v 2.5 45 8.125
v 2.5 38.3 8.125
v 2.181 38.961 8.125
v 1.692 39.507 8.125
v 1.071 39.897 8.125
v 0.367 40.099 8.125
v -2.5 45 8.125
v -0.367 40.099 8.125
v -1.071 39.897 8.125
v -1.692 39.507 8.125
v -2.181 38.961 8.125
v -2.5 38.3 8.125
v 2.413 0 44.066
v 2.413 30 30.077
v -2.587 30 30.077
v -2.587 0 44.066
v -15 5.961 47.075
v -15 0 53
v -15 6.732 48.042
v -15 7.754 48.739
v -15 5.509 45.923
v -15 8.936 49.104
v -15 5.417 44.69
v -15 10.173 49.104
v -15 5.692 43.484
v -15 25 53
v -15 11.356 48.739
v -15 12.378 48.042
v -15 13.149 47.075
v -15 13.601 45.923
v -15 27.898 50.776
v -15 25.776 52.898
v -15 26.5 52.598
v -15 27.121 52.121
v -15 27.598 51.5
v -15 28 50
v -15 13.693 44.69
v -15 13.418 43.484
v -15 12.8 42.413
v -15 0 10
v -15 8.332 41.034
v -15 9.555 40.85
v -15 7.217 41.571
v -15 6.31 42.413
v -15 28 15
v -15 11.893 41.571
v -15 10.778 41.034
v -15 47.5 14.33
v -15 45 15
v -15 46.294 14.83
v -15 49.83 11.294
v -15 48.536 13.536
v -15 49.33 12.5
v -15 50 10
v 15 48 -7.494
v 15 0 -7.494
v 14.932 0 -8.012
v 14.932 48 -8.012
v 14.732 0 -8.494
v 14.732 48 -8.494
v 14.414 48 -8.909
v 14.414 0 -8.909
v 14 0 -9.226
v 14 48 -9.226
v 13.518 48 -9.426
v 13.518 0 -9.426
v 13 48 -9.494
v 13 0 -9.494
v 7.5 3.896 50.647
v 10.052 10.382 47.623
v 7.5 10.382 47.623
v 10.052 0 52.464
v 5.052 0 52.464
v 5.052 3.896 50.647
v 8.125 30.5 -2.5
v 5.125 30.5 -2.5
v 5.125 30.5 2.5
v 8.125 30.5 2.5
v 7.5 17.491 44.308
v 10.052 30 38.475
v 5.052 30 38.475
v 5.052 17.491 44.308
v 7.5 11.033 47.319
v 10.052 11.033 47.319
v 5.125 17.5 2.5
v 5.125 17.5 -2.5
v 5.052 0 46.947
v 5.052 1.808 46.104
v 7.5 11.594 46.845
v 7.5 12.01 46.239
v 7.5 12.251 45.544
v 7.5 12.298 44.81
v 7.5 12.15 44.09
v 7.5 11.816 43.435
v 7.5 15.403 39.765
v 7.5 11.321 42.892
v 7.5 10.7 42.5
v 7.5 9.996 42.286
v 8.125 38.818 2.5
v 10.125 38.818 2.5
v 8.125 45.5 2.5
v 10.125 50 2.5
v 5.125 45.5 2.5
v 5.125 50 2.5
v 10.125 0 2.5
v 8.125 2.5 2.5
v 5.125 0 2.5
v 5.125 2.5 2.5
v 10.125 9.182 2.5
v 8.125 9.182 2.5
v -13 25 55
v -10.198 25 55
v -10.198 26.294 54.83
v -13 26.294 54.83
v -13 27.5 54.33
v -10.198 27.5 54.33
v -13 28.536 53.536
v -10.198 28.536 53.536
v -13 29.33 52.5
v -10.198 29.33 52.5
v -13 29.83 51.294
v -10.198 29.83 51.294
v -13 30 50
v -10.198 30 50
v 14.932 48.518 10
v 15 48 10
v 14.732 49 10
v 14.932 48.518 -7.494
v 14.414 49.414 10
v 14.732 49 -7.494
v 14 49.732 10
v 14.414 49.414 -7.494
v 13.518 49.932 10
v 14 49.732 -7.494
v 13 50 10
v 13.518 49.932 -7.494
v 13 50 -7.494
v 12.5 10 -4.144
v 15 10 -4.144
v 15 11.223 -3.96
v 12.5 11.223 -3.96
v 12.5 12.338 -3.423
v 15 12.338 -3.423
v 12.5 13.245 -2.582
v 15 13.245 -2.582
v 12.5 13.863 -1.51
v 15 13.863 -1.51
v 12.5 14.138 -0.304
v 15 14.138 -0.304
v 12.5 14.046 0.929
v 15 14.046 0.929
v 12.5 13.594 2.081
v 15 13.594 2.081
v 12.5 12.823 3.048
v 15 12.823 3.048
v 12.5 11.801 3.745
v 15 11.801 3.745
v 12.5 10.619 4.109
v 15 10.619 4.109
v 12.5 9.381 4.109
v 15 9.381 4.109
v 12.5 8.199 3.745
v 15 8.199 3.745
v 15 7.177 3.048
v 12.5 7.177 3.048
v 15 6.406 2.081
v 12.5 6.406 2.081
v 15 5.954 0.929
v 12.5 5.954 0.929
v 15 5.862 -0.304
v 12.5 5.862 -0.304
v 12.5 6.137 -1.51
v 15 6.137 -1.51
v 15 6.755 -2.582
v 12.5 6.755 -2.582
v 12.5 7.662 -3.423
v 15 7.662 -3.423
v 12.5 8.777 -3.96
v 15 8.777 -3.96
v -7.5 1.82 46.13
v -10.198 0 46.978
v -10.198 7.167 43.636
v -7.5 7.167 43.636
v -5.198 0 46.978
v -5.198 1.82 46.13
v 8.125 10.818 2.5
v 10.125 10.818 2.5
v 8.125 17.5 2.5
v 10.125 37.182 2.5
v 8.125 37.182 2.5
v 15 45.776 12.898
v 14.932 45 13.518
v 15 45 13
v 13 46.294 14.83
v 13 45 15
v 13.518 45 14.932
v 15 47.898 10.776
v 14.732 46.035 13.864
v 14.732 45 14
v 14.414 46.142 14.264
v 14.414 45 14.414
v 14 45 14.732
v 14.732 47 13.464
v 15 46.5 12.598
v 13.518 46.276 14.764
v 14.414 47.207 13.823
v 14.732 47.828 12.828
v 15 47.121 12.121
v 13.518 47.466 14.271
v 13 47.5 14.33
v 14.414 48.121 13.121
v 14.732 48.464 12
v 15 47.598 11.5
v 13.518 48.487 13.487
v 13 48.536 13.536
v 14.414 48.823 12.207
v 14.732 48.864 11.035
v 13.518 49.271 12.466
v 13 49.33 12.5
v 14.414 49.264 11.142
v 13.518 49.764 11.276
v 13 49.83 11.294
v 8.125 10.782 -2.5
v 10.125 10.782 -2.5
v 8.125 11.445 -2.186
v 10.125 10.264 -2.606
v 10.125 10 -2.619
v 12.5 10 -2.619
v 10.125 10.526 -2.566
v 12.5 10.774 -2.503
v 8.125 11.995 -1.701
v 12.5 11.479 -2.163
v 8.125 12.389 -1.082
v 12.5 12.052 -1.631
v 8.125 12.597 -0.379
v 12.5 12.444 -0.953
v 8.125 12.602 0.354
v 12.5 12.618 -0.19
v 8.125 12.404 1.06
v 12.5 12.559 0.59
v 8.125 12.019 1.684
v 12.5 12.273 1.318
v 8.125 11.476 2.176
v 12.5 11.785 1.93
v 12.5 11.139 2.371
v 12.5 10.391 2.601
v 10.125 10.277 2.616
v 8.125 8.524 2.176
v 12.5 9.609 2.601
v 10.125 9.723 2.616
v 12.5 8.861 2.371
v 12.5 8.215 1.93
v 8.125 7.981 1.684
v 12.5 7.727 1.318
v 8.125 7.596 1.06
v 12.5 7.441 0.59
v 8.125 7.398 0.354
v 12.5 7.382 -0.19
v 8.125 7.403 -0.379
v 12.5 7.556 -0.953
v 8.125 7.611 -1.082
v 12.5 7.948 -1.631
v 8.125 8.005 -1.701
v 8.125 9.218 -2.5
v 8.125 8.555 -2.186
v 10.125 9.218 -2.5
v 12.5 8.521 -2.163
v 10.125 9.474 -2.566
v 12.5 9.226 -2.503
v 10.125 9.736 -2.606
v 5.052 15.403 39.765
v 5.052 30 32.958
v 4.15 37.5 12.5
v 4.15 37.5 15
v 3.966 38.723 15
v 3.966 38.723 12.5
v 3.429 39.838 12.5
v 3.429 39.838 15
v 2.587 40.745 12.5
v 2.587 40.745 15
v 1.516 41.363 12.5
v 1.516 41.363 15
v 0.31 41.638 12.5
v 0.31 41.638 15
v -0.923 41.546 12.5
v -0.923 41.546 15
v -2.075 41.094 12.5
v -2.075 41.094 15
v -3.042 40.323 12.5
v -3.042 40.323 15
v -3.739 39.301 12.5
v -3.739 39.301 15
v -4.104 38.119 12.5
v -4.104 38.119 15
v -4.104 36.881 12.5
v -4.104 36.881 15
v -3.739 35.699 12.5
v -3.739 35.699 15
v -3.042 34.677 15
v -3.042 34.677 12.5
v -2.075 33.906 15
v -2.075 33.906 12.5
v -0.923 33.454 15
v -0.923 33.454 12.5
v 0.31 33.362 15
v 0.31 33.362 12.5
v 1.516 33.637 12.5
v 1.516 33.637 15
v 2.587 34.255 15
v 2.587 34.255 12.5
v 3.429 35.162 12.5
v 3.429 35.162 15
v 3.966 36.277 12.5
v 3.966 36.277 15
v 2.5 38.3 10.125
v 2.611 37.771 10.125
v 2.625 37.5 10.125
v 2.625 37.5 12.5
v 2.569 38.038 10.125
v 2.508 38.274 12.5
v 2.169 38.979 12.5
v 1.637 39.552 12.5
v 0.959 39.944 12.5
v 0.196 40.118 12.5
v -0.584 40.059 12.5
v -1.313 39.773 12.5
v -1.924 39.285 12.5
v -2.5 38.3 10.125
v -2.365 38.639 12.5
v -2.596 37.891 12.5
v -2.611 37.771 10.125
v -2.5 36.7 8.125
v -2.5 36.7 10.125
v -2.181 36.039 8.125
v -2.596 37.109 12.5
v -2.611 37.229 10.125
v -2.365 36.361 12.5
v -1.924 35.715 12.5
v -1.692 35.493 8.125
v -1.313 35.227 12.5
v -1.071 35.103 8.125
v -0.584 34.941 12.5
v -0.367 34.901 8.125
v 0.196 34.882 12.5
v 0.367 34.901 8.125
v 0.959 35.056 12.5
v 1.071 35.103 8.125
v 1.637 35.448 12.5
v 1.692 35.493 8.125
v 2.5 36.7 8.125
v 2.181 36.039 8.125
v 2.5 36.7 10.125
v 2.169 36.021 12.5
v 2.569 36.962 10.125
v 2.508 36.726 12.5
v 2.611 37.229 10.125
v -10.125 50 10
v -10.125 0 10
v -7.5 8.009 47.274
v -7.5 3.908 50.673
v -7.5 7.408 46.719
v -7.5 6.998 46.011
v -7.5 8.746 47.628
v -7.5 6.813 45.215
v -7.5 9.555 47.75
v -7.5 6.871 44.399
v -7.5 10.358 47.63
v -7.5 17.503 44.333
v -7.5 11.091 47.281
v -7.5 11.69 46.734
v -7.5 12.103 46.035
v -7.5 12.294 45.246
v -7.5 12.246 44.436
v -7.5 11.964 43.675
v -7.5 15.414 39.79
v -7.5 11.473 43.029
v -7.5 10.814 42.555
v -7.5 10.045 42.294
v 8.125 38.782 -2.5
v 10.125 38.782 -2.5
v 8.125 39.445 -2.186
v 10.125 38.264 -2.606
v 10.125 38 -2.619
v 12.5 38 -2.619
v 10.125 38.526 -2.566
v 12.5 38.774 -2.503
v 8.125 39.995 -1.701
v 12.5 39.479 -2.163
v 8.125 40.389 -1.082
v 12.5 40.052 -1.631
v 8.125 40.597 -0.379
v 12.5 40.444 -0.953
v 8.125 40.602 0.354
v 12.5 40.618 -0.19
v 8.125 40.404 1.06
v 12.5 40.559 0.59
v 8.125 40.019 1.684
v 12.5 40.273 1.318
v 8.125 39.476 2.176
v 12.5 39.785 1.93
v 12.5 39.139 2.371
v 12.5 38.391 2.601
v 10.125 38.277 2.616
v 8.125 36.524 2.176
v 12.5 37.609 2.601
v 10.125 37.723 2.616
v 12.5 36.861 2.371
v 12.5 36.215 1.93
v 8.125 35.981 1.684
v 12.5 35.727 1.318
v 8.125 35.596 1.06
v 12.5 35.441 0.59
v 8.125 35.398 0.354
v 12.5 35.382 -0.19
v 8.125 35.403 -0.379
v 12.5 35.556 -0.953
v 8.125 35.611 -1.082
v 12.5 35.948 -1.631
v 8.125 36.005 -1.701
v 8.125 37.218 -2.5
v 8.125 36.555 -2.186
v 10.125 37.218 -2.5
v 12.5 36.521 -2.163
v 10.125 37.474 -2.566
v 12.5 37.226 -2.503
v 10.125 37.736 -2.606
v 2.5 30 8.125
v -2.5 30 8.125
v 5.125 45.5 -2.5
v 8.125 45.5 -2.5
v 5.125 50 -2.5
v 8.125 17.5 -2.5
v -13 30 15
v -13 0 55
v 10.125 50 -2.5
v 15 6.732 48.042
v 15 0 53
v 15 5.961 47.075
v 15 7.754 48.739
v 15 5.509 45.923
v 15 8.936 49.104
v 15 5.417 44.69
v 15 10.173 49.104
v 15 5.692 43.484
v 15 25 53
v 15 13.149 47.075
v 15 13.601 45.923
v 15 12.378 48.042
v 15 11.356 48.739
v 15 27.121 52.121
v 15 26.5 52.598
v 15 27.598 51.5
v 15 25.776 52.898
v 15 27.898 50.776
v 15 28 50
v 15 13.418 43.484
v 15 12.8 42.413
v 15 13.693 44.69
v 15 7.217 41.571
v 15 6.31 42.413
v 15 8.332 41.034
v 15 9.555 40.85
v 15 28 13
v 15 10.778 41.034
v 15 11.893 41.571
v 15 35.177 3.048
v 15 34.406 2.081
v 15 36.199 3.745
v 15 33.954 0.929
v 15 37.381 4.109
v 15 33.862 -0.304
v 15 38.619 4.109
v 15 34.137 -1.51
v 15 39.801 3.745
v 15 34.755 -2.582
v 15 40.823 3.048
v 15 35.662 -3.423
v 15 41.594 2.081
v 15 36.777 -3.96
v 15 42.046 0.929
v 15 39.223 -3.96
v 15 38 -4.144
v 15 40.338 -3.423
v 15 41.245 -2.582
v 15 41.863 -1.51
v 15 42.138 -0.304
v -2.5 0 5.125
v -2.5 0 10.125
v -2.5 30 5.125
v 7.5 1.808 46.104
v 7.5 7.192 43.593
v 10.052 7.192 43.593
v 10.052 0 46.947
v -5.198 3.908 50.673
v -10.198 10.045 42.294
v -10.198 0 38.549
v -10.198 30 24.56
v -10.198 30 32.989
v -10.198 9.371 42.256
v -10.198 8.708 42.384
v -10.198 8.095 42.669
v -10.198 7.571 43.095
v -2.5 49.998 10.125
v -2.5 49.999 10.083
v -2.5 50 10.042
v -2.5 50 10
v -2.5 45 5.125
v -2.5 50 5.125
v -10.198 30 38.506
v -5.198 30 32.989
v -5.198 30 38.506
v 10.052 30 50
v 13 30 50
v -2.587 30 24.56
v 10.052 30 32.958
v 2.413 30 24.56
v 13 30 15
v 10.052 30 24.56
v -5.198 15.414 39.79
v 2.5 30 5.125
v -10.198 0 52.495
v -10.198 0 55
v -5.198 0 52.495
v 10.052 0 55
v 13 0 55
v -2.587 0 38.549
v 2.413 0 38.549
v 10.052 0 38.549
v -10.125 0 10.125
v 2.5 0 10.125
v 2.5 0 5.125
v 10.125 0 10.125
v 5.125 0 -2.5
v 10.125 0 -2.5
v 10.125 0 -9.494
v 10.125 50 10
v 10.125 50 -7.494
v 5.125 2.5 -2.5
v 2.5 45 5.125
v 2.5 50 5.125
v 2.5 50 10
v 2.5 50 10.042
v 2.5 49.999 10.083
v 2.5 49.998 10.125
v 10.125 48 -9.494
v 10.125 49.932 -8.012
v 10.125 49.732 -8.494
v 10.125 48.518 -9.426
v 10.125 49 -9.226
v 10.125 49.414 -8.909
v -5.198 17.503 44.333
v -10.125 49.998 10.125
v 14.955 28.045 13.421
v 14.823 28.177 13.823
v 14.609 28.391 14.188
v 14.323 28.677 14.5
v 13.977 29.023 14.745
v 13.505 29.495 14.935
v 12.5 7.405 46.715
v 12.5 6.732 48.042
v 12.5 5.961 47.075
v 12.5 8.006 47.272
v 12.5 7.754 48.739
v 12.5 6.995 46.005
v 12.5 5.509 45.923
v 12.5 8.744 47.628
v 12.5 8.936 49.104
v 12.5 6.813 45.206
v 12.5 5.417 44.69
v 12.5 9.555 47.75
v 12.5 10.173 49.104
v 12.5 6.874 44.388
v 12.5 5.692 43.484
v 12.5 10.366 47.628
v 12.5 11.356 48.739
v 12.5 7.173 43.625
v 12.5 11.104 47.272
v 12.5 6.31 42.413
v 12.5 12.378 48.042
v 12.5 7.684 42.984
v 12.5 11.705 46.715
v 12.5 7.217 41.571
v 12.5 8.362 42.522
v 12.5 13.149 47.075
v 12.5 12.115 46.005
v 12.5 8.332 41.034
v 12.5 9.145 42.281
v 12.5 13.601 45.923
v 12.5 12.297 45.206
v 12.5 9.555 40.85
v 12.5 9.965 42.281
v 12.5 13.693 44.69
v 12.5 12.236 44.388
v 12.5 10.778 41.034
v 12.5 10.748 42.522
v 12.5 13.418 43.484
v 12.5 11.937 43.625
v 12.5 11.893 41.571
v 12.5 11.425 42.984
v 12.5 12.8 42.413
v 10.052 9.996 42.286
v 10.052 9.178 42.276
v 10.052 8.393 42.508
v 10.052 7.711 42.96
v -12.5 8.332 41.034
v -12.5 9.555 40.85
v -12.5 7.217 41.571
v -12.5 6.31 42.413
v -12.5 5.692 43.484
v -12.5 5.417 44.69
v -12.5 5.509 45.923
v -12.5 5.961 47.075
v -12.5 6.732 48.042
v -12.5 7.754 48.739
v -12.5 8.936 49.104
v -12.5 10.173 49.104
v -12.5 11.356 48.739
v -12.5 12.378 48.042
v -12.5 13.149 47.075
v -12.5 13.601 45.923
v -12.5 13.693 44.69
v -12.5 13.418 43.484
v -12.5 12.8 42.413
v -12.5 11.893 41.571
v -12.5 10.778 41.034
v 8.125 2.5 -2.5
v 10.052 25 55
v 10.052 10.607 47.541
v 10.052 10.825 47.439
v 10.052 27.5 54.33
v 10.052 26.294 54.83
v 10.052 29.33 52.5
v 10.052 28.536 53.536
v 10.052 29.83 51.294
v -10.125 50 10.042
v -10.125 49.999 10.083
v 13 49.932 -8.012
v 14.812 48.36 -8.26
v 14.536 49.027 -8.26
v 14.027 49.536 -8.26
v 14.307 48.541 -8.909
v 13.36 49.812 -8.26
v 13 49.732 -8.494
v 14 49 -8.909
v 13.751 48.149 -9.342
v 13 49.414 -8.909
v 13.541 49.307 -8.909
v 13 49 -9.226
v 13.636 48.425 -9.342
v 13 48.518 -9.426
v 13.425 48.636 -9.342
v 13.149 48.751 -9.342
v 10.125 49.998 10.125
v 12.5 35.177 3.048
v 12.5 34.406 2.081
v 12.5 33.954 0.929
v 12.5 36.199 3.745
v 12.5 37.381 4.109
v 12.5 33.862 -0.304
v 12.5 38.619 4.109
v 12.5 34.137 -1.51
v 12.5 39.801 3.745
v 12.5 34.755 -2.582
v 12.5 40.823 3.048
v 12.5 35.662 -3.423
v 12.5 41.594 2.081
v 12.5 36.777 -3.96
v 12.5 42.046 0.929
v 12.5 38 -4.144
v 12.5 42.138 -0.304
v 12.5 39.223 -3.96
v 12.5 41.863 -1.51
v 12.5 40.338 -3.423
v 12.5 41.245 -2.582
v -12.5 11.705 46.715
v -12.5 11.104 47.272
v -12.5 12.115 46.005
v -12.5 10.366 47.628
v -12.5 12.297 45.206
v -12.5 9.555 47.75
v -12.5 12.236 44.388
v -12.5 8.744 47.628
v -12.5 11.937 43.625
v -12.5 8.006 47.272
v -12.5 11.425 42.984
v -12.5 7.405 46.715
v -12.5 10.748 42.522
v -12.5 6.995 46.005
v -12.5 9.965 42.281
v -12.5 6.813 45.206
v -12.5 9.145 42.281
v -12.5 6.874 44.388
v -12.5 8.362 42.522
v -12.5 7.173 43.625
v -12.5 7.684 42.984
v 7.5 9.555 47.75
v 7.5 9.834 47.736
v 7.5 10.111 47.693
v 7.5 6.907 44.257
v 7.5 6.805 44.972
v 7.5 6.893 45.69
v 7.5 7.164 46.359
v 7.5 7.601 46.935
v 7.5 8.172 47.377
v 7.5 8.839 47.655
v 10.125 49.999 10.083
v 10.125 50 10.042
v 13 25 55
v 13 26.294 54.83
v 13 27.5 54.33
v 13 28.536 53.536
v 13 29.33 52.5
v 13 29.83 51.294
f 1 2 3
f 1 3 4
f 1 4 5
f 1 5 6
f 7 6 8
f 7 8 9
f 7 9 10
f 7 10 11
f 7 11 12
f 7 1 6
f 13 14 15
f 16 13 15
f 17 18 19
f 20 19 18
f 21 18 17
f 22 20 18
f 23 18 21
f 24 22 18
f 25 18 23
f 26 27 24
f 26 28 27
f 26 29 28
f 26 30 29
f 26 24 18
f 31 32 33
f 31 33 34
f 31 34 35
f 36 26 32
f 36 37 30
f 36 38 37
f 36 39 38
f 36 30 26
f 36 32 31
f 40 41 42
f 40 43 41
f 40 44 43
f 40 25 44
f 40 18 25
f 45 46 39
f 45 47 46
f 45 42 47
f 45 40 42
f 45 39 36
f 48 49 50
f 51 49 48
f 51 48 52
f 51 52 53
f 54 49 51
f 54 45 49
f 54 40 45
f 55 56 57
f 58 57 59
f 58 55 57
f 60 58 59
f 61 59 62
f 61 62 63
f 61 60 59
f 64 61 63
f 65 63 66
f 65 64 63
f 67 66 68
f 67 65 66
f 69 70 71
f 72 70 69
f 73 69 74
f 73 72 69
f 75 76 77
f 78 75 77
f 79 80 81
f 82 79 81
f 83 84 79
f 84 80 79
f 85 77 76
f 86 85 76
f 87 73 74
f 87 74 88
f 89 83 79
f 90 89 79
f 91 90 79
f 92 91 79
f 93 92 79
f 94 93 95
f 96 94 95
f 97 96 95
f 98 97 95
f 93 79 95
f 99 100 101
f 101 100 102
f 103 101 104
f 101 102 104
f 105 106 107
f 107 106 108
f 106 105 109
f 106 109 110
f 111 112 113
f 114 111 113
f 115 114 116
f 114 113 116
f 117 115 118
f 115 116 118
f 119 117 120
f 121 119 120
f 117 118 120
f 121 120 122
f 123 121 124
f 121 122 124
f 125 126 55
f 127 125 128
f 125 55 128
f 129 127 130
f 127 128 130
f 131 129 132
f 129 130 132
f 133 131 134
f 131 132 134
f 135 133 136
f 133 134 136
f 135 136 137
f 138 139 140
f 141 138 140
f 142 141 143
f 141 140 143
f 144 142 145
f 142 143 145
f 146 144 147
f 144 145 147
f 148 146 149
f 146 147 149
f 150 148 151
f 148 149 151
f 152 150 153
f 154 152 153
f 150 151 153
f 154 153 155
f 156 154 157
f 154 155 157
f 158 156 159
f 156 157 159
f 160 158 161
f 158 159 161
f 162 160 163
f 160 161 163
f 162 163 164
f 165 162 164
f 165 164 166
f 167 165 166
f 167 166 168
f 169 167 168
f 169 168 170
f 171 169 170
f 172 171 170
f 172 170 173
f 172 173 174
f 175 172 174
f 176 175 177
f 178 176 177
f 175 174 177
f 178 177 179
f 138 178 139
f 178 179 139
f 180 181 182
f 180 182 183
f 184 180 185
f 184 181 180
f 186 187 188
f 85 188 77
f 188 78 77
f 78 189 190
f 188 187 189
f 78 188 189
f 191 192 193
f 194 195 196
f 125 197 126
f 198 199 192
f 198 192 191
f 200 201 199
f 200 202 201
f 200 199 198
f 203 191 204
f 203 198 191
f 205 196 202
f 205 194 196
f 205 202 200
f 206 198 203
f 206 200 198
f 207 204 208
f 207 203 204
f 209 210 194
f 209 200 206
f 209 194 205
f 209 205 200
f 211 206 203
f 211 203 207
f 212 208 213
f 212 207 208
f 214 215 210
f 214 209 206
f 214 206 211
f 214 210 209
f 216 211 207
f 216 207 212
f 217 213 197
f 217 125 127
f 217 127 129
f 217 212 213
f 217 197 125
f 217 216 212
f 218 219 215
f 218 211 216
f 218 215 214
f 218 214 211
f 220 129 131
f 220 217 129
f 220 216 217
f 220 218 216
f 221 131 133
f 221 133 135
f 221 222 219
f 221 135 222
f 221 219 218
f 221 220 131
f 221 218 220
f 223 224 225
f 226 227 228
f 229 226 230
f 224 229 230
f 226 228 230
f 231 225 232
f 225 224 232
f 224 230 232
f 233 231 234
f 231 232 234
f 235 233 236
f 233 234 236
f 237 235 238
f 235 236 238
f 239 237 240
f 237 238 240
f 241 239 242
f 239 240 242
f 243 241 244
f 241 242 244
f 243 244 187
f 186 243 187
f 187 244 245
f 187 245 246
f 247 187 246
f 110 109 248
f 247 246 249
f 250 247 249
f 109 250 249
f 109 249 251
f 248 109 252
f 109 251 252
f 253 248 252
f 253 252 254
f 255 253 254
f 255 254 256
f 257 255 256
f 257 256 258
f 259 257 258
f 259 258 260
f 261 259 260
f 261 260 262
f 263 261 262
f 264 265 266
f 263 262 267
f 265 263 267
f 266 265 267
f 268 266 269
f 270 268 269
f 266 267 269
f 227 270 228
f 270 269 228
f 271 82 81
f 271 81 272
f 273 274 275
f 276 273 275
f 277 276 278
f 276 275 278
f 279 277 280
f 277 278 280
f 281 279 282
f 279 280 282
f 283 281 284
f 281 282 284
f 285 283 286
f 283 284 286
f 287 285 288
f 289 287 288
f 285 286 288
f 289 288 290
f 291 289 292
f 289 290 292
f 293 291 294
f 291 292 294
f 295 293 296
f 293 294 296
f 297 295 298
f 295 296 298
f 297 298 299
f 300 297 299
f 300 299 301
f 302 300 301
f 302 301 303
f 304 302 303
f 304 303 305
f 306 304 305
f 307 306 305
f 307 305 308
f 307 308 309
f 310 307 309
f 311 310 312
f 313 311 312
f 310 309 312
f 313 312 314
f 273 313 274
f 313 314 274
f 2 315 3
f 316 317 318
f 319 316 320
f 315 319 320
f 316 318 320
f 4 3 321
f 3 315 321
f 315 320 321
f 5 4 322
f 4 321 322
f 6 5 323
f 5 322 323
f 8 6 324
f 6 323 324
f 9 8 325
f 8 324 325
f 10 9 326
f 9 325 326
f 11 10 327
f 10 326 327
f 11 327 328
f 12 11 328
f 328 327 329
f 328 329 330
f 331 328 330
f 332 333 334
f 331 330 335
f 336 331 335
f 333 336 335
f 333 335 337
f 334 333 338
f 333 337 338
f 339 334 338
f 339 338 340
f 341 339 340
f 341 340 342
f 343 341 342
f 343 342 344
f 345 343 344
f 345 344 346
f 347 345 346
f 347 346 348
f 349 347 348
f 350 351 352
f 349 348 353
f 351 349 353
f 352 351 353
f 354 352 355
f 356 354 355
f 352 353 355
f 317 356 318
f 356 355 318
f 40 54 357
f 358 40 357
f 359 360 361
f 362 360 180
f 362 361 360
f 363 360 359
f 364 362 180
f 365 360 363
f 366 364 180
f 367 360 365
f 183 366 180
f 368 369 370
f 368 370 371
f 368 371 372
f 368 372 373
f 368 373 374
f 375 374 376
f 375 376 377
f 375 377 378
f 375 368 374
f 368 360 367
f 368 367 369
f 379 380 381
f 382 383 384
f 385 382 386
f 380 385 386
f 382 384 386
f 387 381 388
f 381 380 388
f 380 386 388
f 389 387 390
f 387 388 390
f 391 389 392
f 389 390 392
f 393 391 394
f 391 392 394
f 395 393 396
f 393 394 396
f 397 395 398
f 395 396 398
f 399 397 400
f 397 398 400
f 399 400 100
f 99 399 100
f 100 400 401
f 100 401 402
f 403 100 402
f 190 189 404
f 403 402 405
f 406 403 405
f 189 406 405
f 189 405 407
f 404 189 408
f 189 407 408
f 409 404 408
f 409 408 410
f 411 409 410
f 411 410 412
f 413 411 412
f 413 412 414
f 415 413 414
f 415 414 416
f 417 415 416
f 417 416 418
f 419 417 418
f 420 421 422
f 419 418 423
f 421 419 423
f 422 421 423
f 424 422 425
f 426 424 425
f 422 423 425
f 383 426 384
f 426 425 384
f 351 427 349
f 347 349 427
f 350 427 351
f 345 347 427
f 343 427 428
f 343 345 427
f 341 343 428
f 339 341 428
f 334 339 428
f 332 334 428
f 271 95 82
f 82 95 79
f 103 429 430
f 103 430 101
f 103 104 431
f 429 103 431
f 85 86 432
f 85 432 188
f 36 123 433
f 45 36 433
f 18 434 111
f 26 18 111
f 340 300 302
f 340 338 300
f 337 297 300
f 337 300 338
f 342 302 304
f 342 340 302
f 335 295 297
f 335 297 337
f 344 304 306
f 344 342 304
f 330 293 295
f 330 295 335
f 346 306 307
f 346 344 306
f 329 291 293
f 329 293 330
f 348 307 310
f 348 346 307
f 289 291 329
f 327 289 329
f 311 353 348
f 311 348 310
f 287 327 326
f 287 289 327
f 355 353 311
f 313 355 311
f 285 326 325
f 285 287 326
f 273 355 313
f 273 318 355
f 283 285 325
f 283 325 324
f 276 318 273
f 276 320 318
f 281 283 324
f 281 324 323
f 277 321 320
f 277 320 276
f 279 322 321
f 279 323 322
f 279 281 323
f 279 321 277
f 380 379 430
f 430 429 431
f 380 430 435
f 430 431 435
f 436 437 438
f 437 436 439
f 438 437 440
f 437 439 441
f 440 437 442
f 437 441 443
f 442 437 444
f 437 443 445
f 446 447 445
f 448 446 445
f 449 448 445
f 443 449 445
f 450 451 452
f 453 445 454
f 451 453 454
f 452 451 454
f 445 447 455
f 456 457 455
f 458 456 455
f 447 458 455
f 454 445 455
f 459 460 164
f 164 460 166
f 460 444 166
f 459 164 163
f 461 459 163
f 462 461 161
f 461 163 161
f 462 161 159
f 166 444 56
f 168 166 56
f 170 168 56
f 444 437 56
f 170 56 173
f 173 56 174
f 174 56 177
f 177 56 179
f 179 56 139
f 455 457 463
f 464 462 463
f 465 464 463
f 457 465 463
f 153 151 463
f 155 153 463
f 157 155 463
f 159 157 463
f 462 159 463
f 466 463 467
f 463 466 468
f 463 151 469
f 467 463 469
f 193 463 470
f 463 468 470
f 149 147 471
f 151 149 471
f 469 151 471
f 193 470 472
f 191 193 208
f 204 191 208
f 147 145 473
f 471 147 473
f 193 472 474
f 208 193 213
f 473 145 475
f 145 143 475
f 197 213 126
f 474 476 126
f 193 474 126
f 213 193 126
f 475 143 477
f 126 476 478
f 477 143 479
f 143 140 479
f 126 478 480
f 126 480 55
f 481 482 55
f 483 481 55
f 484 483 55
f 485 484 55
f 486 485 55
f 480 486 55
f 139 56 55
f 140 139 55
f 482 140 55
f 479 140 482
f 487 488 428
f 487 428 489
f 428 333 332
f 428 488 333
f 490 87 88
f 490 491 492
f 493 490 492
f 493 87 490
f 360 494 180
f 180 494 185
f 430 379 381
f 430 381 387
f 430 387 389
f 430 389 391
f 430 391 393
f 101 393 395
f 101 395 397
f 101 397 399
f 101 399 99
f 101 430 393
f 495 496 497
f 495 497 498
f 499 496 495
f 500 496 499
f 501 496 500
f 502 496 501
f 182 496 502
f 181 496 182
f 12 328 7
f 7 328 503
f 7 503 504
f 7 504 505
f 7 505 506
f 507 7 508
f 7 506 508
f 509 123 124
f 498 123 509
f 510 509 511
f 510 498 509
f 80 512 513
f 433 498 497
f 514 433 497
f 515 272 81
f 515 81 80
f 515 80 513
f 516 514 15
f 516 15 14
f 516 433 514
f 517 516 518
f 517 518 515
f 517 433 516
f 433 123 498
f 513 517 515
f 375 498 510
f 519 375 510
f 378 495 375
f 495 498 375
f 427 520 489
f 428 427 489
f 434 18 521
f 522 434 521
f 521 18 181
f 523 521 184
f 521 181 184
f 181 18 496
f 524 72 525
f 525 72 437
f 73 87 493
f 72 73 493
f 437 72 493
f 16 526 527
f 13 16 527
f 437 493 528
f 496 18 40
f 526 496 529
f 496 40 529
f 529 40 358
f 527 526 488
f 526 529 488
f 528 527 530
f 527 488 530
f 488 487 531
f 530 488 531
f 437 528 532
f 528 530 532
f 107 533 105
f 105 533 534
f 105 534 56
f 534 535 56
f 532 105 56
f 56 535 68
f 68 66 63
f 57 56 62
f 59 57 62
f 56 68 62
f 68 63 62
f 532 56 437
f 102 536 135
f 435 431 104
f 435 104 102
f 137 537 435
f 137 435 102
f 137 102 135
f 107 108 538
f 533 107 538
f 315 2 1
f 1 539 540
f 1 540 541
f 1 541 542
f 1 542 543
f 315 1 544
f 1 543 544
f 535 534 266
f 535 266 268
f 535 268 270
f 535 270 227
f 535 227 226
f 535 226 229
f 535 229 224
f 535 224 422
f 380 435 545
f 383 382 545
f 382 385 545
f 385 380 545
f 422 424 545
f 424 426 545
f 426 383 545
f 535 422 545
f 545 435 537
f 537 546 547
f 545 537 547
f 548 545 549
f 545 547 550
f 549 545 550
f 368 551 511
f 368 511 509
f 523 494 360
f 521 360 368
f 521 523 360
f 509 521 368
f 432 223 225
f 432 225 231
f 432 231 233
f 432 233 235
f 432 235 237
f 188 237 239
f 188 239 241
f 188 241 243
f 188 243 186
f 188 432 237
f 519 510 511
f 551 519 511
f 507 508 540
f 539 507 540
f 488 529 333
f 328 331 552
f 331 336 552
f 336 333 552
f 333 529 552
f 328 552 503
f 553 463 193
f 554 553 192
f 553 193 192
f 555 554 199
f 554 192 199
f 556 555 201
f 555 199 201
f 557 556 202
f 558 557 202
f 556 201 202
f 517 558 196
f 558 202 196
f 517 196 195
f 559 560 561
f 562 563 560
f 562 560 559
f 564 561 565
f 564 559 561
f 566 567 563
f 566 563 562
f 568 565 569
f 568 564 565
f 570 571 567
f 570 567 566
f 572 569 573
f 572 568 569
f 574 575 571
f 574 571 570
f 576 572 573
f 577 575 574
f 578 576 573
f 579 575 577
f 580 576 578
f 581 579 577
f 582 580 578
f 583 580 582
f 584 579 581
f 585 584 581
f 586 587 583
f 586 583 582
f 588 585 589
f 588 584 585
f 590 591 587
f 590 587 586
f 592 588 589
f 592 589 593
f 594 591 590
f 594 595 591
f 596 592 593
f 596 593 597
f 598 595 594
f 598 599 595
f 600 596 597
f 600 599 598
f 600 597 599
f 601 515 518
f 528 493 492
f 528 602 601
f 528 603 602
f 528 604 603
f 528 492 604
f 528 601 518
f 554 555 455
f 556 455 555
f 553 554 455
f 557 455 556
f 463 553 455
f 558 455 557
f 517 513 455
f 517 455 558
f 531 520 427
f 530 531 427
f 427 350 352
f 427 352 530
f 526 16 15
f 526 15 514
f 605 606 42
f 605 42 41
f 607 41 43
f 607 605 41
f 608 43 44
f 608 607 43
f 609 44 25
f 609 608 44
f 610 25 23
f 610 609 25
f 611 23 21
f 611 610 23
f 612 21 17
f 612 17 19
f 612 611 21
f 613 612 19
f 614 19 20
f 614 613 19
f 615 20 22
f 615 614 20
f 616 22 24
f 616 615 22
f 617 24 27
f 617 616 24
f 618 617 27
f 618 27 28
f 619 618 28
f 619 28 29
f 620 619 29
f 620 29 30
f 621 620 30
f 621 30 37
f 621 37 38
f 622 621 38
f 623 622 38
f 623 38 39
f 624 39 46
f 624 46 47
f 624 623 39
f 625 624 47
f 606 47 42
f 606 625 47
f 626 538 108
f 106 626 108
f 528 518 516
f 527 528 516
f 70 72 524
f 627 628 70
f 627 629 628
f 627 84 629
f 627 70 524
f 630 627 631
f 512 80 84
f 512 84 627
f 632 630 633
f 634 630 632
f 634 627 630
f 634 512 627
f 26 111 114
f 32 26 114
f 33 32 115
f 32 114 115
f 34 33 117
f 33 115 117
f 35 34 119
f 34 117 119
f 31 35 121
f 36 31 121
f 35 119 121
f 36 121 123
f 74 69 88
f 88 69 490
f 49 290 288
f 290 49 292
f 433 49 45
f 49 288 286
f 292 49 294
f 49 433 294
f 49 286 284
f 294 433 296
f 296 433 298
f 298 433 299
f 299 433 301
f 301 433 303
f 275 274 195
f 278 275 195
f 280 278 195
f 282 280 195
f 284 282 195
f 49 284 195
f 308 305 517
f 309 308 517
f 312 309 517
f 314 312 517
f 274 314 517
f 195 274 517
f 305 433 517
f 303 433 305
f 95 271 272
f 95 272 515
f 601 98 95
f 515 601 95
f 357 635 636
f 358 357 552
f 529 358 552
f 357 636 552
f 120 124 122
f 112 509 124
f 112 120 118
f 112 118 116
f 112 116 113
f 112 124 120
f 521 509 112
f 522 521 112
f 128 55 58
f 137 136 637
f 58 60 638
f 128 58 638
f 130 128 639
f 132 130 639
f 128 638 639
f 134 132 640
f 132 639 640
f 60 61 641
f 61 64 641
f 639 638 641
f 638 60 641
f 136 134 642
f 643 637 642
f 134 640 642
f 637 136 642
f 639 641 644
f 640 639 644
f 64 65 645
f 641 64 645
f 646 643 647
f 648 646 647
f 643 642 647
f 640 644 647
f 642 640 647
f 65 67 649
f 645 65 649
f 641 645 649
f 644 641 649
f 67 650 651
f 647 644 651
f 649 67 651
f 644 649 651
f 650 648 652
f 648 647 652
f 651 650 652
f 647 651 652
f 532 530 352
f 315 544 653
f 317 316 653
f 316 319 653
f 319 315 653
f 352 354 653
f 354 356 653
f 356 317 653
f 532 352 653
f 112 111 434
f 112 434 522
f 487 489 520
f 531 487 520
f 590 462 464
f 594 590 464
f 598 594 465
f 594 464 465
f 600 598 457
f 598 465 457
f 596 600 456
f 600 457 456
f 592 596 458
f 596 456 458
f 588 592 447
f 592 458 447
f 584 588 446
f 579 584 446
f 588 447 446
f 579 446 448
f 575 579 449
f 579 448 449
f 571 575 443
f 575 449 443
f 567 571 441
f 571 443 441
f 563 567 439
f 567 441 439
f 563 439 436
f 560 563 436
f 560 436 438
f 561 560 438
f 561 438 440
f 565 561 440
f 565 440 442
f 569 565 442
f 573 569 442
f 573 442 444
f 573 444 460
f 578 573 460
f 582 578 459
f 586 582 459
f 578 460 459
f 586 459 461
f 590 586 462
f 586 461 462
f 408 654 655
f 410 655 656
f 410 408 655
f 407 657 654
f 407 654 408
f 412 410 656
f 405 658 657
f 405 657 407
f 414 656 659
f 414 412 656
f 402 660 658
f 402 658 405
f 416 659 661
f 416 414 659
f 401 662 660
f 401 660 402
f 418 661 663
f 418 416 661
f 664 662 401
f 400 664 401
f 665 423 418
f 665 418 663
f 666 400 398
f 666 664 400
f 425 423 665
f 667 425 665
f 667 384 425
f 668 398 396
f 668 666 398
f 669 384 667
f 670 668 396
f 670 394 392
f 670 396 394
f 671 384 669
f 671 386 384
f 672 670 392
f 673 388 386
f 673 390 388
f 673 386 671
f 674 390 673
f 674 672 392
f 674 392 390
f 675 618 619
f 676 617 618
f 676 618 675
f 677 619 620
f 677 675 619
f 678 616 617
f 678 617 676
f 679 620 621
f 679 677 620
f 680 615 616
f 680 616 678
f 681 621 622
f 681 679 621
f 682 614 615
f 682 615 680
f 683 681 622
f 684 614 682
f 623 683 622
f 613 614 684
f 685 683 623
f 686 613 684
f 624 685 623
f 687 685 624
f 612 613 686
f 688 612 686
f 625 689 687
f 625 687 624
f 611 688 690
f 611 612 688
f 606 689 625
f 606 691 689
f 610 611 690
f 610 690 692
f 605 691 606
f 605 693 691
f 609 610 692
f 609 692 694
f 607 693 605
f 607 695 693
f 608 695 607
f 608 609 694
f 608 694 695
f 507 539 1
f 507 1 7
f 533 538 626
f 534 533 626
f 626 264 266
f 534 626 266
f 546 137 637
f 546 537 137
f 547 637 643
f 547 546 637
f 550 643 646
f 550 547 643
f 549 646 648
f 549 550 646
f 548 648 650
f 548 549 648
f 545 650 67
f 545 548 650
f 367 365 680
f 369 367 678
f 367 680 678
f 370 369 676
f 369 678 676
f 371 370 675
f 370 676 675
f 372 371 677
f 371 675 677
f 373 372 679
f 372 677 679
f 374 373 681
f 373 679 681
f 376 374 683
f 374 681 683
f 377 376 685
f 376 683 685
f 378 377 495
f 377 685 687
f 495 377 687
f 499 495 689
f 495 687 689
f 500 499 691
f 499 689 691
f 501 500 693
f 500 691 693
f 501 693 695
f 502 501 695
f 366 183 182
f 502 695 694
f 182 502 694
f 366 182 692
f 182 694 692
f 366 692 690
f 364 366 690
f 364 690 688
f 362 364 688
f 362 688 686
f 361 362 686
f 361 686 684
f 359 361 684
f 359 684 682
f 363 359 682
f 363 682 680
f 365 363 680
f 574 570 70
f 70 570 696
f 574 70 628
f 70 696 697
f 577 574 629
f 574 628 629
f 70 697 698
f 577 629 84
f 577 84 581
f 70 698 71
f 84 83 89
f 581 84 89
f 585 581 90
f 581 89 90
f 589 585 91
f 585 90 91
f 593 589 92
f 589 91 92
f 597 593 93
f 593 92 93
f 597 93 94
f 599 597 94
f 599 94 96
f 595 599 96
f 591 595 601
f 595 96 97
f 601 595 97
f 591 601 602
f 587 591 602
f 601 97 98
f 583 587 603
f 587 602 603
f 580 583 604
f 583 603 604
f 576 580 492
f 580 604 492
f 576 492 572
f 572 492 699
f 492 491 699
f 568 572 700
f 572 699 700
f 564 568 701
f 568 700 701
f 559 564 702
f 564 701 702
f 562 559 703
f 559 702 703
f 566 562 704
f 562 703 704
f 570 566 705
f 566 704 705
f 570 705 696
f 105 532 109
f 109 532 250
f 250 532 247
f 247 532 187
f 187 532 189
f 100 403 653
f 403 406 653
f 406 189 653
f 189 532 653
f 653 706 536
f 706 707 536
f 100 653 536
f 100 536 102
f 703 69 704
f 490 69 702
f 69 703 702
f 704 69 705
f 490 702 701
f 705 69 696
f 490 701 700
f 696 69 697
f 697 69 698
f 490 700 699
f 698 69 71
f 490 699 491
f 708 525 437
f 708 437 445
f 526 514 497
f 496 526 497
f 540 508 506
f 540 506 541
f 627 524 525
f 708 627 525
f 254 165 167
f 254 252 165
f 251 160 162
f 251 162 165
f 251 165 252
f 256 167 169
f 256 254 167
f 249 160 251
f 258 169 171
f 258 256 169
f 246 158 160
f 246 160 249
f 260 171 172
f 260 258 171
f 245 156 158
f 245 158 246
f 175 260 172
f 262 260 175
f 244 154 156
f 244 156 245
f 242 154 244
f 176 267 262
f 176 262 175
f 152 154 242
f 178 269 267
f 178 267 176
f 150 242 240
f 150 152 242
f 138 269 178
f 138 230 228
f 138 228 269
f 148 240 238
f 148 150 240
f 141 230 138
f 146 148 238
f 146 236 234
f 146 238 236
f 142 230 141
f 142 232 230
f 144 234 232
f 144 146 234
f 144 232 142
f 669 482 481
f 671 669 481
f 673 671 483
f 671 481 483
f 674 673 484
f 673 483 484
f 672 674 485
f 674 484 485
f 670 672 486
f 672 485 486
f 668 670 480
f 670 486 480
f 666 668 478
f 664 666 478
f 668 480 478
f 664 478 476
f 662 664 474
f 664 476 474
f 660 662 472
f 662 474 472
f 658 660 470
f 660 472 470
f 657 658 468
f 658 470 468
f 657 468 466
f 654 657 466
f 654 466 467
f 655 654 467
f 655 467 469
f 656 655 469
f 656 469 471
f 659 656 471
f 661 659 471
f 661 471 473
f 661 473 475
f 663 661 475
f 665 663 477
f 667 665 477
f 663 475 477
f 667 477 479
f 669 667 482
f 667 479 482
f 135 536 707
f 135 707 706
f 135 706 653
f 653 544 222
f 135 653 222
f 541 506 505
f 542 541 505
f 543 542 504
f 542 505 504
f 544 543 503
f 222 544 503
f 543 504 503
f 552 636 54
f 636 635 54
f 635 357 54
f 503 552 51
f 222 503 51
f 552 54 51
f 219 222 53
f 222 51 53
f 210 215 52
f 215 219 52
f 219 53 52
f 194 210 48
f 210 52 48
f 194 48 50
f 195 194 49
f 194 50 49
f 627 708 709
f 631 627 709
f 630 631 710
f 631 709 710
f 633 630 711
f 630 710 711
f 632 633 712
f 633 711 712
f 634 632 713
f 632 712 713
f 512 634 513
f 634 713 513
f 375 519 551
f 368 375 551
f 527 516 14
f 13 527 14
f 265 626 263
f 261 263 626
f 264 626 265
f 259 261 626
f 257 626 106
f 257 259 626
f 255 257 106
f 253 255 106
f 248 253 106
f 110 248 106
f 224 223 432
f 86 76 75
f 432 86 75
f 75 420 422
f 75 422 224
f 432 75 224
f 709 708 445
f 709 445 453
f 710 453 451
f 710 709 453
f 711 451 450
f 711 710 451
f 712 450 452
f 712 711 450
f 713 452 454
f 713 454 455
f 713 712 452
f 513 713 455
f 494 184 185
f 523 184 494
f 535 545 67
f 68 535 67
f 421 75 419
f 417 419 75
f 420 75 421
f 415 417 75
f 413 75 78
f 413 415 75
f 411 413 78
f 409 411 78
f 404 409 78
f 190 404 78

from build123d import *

# Parameters (mm, degrees)
Z_EXTRUSION_MOUNT_W     = 30
Z_EXTRUSION_MOUNT_H     = 30
BOSS_EXTRUDE1_DEPTH     = 50
CUT_EXTRUDE1_DEPTH      = 50
SKETCH3_W               = 30
SKETCH3_H               = 5.505679799
CUT_EXTRUDE3_DEPTH      = 50
SKETCH4_W               = 30
SKETCH4_H               = 30
BOSS_EXTRUDE3_DEPTH     = 40
CUT_EXTRUDE4_DEPTH      = 10
CUT_EXTRUDE4_DEPTH_BACK = 62.479626952
FILLET1_R               = 5
FILLET2_R               = 5
SKETCH11_R              = 2.75
CUT_EXTRUDE14_DEPTH     = 30
SKETCH22_R              = 4.15
CUT_EXTRUDE17_DEPTH     = 2.5
CUT_EXTRUDE18_START     = -2.5
SKETCH23_R              = 4.15
CUT_EXTRUDE18_DEPTH     = 2.5
FILLET4_R               = 2
SKETCH24_W              = 4.875
SKETCH24_H              = 19.494320201
CUT_EXTRUDE19_DEPTH     = 76.828754441
SKETCH25_R              = 2.625
CUT_EXTRUDE20_DEPTH     = 81.156097709
SKETCH26_R              = 4.15
CUT_EXTRUDE21_DEPTH     = 2.5
SKETCH27_R              = 2.625
CUT_EXTRUDE23_DEPTH     = 66.76473219
SKETCH28_R              = 4.15
CUT_EXTRUDE24_DEPTH     = 2.5
SKETCH29_W              = 10
SKETCH29_H              = 15
CUT_EXTRUDE25_DEPTH     = 3
SKETCH31_W              = 10
SKETCH31_H              = 15
CUT_EXTRUDE27_DEPTH     = 3
SKETCH33_W              = 20.25
SKETCH33_H              = 10.783419854
CUT_EXTRUDE29_DEPTH     = 62.479626952
CUT_EXTRUDE30_DEPTH     = 7.5
CHAMFER1_SIZE           = 2
FILLET5_R               = 2


with BuildPart() as part:
    # Z extrusion mount → Boss-Extrude1 (new body)
    with BuildSketch(Plane(origin=(0, 0, 0), x_dir=(1, 0, 0), z_dir=(0, 1, 0))):
        Rectangle(Z_EXTRUSION_MOUNT_W, Z_EXTRUSION_MOUNT_H)
    extrude(amount=BOSS_EXTRUDE1_DEPTH)

    # Sketch2 → Cut-Extrude1 (cut)
    with BuildSketch(Plane(origin=(0, 50, 0), x_dir=(1, 0, 0), z_dir=(0, 1, 0))):
        Polygon((-10.125, 10.125), (-10.125, -10.125), (-2.5, -10.125), (-2.5, -5.125), (2.5, -5.125), (2.5, -10.125), (10.125, -10.125), (10.125, -2.5), (5.125, -2.5), (5.125, 2.5), (10.125, 2.5), (10.125, 10.125), align=None)
    extrude(amount=-CUT_EXTRUDE1_DEPTH, mode=Mode.SUBTRACT)

    # Sketch3 → Cut-Extrude3 (cut)
    with BuildSketch(Plane(origin=(0, 50, 0), x_dir=(1, 0, 0), z_dir=(0, 1, 0))):
        with Locations((0, 12.247160101)):
            Rectangle(SKETCH3_W, SKETCH3_H)
    extrude(amount=-CUT_EXTRUDE3_DEPTH, mode=Mode.SUBTRACT)

    # Sketch4 → Boss-Extrude3 (add)
    with BuildSketch(Plane.XY.offset(15)):
        with Locations((0, 15)):
            Rectangle(SKETCH4_W, SKETCH4_H)
    extrude(amount=BOSS_EXTRUDE3_DEPTH)

    # Sketch12 → Cut-Extrude4 (cut, two sides: drawn at the far end of the back side and taken through both)
    with BuildSketch(Plane(origin=(-15, 30, 35), x_dir=(-1, 0, 0), z_dir=(0, 0.9063077870366478, -0.42261826174070405)).offset(-CUT_EXTRUDE4_DEPTH_BACK)):
        Polygon((-25.051676804, -1.850953689), (-25.051676804, -9.461830913), (-17.412554028, -9.461830913), (-17.412554028, -4.461830913), (-12.412554028, -4.461830913), (-12.412554028, -9.461830913), (-4.801676804, -9.461830913), (-4.801676804, -1.822708137), (-9.801676804, -1.822708137), (-9.801676804, 3.177291863), (-4.801676804, 3.177291863), (-4.801676804, 10.788169087), (-12.440799581, 10.788169087), (-12.440799581, 5.788169087), (-17.440799581, 5.788169087), (-17.440799581, 10.788169087), (-25.051676804, 10.788169087), (-25.051676804, 3.149046311), (-20.051676804, 3.149046311), (-20.051676804, -1.850953689), align=None)
    extrude(amount=CUT_EXTRUDE4_DEPTH + CUT_EXTRUDE4_DEPTH_BACK, mode=Mode.SUBTRACT)

    # Fillet1
    fillet1_edges = [part.edges().sort_by_distance(p)[0] for p in [
        (0, 30, 55),
    ]]
    fillet(fillet1_edges, radius=FILLET1_R)

    # Fillet2
    # the kernel refuses this fillet: 5 mm, written as the material it takes off along each edge
    with BuildSketch(Plane(origin=(-27.5, 50, 15), x_dir=(0, -1, 0), z_dir=(1, 0, 0))) as fillet2_piece_1:
        with BuildLine():
            CenterArc((FILLET2_R, FILLET2_R), FILLET2_R, 180, 90)
            Line((0, FILLET2_R), (0, 0))
            Line((0, 0), (FILLET2_R, 0))
        make_face()
    extrude(amount=55, mode=Mode.SUBTRACT)

    # Sketch11 → Cut-Extrude14 (cut)
    with BuildSketch(Plane.ZY.offset(15)):
        with Locations((45, 9.554930795)):
            Circle(SKETCH11_R)
    extrude(amount=-CUT_EXTRUDE14_DEPTH, mode=Mode.SUBTRACT)

    # Sketch22 → Cut-Extrude17 (cut)
    with BuildSketch(Plane(origin=(15, 0, 0), x_dir=(0, 0, -1), z_dir=(1, 0, 0))):
        with Locations((-45, 9.554930795)):
            Circle(SKETCH22_R)
    extrude(amount=-CUT_EXTRUDE17_DEPTH, mode=Mode.SUBTRACT)

    # Sketch23 → Cut-Extrude18 (cut)
    with BuildSketch(Plane.ZY.offset(15).offset(CUT_EXTRUDE18_START)):
        with Locations(Location((45, 9.554930795, 0), (0, 0, 180))):
            Circle(SKETCH23_R)
    extrude(amount=CUT_EXTRUDE18_DEPTH, mode=Mode.SUBTRACT)

    # Fillet4
    fillet4_edges = [part.edges().sort_by_distance(p)[0] for p in [
        (15, 50, 0.252839899),
        (15, 48.535533906, 13.535533906),
        (15, 37.5, 15),
    ]]
    fillet(fillet4_edges, radius=FILLET4_R)

    # Sketch24 → Cut-Extrude19 (cut, through all)
    with BuildSketch(Plane(origin=(0, 50, 0), x_dir=(1, 0, 0), z_dir=(0, 1, 0))):
        with Locations((-12.5625, -0.252839899)):
            Rectangle(SKETCH24_W, SKETCH24_H)
    extrude(amount=-CUT_EXTRUDE19_DEPTH, mode=Mode.SUBTRACT)

    # Sketch25 → Cut-Extrude20 (cut, through all)
    with BuildSketch(Plane(origin=(15, 0, 0), x_dir=(0, 0, -1), z_dir=(1, 0, 0))):
        with Locations((-0.005679799, 38)):
            Circle(SKETCH25_R)
        with Locations((-0.005679799, 10)):
            Circle(SKETCH25_R)
    extrude(amount=-CUT_EXTRUDE20_DEPTH, mode=Mode.SUBTRACT)

    # Sketch26 → Cut-Extrude21 (cut)
    with BuildSketch(Plane(origin=(15, 0, 0), x_dir=(0, 0, -1), z_dir=(1, 0, 0))):
        with Locations((-0.005679799, 38)):
            Circle(SKETCH26_R)
        with Locations((-0.005679799, 10)):
            Circle(SKETCH26_R)
    extrude(amount=-CUT_EXTRUDE21_DEPTH, mode=Mode.SUBTRACT)

    # Sketch27 → Cut-Extrude23 (cut, through all)
    with BuildSketch(Plane.XY.offset(15)):
        with Locations((0, 37.5)):
            Circle(SKETCH27_R)
    extrude(amount=-CUT_EXTRUDE23_DEPTH, mode=Mode.SUBTRACT)

    # Sketch28 → Cut-Extrude24 (cut)
    with BuildSketch(Plane.XY.offset(15)):
        with Locations((0, 37.5)):
            Circle(SKETCH28_R)
    extrude(amount=-CUT_EXTRUDE24_DEPTH, mode=Mode.SUBTRACT)

    # Sketch29 → Cut-Extrude25 (cut)
    with BuildSketch(Plane(origin=(0, 0, 5.125), x_dir=(-1, 0, 0), z_dir=(0, 0, -1))):
        with Locations((0, 37.5)):
            Rectangle(SKETCH29_W, SKETCH29_H)
    extrude(amount=-CUT_EXTRUDE25_DEPTH, mode=Mode.SUBTRACT)

    # Sketch31 → Cut-Extrude27 (cut)
    with BuildSketch(Plane.ZY.offset(-5.125)):
        with Locations((0.005679799, 38)):
            Rectangle(SKETCH31_W, SKETCH31_H)
        with Locations((0.005679799, 10)):
            Rectangle(SKETCH31_W, SKETCH31_H)
    extrude(amount=-CUT_EXTRUDE27_DEPTH, mode=Mode.SUBTRACT)

    # Sketch33 → Cut-Extrude29 (cut, through all)
    with BuildSketch(Plane(origin=(-15, 30, 35), x_dir=(-1, 0, 0), z_dir=(0, 0.9063077870366478, -0.42261826174070405))):
        with Locations((-14.926676804, 11.08981557)):
            Rectangle(SKETCH33_W, SKETCH33_H)
    extrude(amount=-CUT_EXTRUDE29_DEPTH, mode=Mode.SUBTRACT)

    # Sketch35 → Cut-Extrude30 (cut, symmetric)
    with BuildSketch(Plane(origin=(0, 0, 0), x_dir=(0, 0, -1), z_dir=(1, 0, 0))):
        Polygon((-37.747378495, 14.475156436), (-45.033706868, 17.825136051), (-52.252621505, 4.634705153), (-44.966293132, 1.284725539), align=None)
    extrude(amount=CUT_EXTRUDE30_DEPTH, both=True, mode=Mode.SUBTRACT)

    # Chamfer1
    chamfer1_edges = [part.edges().sort_by_distance(p)[0] for p in [
        (15, 12.5, 55),
        (15, 28.535533906, 53.535533906),
        (15, 30, 31.5),
        (-15, 12.5, 55),
        (-15, 28.535533906, 53.535533906),
        (-15, 30, 32.5),
    ]]
    chamfer(chamfer1_edges, length=CHAMFER1_SIZE)

    # Fillet5
    fillet5_edges = [part.edges().sort_by_distance(p)[0] for p in [
        (14.414213562, 49.414213562, -9.494320201),
        (15, 24, -9.494320201),
        (11.5625, 50, -9.494320201),
    ]]
    fillet(fillet5_edges, radius=FILLET5_R)


solid = part.part
